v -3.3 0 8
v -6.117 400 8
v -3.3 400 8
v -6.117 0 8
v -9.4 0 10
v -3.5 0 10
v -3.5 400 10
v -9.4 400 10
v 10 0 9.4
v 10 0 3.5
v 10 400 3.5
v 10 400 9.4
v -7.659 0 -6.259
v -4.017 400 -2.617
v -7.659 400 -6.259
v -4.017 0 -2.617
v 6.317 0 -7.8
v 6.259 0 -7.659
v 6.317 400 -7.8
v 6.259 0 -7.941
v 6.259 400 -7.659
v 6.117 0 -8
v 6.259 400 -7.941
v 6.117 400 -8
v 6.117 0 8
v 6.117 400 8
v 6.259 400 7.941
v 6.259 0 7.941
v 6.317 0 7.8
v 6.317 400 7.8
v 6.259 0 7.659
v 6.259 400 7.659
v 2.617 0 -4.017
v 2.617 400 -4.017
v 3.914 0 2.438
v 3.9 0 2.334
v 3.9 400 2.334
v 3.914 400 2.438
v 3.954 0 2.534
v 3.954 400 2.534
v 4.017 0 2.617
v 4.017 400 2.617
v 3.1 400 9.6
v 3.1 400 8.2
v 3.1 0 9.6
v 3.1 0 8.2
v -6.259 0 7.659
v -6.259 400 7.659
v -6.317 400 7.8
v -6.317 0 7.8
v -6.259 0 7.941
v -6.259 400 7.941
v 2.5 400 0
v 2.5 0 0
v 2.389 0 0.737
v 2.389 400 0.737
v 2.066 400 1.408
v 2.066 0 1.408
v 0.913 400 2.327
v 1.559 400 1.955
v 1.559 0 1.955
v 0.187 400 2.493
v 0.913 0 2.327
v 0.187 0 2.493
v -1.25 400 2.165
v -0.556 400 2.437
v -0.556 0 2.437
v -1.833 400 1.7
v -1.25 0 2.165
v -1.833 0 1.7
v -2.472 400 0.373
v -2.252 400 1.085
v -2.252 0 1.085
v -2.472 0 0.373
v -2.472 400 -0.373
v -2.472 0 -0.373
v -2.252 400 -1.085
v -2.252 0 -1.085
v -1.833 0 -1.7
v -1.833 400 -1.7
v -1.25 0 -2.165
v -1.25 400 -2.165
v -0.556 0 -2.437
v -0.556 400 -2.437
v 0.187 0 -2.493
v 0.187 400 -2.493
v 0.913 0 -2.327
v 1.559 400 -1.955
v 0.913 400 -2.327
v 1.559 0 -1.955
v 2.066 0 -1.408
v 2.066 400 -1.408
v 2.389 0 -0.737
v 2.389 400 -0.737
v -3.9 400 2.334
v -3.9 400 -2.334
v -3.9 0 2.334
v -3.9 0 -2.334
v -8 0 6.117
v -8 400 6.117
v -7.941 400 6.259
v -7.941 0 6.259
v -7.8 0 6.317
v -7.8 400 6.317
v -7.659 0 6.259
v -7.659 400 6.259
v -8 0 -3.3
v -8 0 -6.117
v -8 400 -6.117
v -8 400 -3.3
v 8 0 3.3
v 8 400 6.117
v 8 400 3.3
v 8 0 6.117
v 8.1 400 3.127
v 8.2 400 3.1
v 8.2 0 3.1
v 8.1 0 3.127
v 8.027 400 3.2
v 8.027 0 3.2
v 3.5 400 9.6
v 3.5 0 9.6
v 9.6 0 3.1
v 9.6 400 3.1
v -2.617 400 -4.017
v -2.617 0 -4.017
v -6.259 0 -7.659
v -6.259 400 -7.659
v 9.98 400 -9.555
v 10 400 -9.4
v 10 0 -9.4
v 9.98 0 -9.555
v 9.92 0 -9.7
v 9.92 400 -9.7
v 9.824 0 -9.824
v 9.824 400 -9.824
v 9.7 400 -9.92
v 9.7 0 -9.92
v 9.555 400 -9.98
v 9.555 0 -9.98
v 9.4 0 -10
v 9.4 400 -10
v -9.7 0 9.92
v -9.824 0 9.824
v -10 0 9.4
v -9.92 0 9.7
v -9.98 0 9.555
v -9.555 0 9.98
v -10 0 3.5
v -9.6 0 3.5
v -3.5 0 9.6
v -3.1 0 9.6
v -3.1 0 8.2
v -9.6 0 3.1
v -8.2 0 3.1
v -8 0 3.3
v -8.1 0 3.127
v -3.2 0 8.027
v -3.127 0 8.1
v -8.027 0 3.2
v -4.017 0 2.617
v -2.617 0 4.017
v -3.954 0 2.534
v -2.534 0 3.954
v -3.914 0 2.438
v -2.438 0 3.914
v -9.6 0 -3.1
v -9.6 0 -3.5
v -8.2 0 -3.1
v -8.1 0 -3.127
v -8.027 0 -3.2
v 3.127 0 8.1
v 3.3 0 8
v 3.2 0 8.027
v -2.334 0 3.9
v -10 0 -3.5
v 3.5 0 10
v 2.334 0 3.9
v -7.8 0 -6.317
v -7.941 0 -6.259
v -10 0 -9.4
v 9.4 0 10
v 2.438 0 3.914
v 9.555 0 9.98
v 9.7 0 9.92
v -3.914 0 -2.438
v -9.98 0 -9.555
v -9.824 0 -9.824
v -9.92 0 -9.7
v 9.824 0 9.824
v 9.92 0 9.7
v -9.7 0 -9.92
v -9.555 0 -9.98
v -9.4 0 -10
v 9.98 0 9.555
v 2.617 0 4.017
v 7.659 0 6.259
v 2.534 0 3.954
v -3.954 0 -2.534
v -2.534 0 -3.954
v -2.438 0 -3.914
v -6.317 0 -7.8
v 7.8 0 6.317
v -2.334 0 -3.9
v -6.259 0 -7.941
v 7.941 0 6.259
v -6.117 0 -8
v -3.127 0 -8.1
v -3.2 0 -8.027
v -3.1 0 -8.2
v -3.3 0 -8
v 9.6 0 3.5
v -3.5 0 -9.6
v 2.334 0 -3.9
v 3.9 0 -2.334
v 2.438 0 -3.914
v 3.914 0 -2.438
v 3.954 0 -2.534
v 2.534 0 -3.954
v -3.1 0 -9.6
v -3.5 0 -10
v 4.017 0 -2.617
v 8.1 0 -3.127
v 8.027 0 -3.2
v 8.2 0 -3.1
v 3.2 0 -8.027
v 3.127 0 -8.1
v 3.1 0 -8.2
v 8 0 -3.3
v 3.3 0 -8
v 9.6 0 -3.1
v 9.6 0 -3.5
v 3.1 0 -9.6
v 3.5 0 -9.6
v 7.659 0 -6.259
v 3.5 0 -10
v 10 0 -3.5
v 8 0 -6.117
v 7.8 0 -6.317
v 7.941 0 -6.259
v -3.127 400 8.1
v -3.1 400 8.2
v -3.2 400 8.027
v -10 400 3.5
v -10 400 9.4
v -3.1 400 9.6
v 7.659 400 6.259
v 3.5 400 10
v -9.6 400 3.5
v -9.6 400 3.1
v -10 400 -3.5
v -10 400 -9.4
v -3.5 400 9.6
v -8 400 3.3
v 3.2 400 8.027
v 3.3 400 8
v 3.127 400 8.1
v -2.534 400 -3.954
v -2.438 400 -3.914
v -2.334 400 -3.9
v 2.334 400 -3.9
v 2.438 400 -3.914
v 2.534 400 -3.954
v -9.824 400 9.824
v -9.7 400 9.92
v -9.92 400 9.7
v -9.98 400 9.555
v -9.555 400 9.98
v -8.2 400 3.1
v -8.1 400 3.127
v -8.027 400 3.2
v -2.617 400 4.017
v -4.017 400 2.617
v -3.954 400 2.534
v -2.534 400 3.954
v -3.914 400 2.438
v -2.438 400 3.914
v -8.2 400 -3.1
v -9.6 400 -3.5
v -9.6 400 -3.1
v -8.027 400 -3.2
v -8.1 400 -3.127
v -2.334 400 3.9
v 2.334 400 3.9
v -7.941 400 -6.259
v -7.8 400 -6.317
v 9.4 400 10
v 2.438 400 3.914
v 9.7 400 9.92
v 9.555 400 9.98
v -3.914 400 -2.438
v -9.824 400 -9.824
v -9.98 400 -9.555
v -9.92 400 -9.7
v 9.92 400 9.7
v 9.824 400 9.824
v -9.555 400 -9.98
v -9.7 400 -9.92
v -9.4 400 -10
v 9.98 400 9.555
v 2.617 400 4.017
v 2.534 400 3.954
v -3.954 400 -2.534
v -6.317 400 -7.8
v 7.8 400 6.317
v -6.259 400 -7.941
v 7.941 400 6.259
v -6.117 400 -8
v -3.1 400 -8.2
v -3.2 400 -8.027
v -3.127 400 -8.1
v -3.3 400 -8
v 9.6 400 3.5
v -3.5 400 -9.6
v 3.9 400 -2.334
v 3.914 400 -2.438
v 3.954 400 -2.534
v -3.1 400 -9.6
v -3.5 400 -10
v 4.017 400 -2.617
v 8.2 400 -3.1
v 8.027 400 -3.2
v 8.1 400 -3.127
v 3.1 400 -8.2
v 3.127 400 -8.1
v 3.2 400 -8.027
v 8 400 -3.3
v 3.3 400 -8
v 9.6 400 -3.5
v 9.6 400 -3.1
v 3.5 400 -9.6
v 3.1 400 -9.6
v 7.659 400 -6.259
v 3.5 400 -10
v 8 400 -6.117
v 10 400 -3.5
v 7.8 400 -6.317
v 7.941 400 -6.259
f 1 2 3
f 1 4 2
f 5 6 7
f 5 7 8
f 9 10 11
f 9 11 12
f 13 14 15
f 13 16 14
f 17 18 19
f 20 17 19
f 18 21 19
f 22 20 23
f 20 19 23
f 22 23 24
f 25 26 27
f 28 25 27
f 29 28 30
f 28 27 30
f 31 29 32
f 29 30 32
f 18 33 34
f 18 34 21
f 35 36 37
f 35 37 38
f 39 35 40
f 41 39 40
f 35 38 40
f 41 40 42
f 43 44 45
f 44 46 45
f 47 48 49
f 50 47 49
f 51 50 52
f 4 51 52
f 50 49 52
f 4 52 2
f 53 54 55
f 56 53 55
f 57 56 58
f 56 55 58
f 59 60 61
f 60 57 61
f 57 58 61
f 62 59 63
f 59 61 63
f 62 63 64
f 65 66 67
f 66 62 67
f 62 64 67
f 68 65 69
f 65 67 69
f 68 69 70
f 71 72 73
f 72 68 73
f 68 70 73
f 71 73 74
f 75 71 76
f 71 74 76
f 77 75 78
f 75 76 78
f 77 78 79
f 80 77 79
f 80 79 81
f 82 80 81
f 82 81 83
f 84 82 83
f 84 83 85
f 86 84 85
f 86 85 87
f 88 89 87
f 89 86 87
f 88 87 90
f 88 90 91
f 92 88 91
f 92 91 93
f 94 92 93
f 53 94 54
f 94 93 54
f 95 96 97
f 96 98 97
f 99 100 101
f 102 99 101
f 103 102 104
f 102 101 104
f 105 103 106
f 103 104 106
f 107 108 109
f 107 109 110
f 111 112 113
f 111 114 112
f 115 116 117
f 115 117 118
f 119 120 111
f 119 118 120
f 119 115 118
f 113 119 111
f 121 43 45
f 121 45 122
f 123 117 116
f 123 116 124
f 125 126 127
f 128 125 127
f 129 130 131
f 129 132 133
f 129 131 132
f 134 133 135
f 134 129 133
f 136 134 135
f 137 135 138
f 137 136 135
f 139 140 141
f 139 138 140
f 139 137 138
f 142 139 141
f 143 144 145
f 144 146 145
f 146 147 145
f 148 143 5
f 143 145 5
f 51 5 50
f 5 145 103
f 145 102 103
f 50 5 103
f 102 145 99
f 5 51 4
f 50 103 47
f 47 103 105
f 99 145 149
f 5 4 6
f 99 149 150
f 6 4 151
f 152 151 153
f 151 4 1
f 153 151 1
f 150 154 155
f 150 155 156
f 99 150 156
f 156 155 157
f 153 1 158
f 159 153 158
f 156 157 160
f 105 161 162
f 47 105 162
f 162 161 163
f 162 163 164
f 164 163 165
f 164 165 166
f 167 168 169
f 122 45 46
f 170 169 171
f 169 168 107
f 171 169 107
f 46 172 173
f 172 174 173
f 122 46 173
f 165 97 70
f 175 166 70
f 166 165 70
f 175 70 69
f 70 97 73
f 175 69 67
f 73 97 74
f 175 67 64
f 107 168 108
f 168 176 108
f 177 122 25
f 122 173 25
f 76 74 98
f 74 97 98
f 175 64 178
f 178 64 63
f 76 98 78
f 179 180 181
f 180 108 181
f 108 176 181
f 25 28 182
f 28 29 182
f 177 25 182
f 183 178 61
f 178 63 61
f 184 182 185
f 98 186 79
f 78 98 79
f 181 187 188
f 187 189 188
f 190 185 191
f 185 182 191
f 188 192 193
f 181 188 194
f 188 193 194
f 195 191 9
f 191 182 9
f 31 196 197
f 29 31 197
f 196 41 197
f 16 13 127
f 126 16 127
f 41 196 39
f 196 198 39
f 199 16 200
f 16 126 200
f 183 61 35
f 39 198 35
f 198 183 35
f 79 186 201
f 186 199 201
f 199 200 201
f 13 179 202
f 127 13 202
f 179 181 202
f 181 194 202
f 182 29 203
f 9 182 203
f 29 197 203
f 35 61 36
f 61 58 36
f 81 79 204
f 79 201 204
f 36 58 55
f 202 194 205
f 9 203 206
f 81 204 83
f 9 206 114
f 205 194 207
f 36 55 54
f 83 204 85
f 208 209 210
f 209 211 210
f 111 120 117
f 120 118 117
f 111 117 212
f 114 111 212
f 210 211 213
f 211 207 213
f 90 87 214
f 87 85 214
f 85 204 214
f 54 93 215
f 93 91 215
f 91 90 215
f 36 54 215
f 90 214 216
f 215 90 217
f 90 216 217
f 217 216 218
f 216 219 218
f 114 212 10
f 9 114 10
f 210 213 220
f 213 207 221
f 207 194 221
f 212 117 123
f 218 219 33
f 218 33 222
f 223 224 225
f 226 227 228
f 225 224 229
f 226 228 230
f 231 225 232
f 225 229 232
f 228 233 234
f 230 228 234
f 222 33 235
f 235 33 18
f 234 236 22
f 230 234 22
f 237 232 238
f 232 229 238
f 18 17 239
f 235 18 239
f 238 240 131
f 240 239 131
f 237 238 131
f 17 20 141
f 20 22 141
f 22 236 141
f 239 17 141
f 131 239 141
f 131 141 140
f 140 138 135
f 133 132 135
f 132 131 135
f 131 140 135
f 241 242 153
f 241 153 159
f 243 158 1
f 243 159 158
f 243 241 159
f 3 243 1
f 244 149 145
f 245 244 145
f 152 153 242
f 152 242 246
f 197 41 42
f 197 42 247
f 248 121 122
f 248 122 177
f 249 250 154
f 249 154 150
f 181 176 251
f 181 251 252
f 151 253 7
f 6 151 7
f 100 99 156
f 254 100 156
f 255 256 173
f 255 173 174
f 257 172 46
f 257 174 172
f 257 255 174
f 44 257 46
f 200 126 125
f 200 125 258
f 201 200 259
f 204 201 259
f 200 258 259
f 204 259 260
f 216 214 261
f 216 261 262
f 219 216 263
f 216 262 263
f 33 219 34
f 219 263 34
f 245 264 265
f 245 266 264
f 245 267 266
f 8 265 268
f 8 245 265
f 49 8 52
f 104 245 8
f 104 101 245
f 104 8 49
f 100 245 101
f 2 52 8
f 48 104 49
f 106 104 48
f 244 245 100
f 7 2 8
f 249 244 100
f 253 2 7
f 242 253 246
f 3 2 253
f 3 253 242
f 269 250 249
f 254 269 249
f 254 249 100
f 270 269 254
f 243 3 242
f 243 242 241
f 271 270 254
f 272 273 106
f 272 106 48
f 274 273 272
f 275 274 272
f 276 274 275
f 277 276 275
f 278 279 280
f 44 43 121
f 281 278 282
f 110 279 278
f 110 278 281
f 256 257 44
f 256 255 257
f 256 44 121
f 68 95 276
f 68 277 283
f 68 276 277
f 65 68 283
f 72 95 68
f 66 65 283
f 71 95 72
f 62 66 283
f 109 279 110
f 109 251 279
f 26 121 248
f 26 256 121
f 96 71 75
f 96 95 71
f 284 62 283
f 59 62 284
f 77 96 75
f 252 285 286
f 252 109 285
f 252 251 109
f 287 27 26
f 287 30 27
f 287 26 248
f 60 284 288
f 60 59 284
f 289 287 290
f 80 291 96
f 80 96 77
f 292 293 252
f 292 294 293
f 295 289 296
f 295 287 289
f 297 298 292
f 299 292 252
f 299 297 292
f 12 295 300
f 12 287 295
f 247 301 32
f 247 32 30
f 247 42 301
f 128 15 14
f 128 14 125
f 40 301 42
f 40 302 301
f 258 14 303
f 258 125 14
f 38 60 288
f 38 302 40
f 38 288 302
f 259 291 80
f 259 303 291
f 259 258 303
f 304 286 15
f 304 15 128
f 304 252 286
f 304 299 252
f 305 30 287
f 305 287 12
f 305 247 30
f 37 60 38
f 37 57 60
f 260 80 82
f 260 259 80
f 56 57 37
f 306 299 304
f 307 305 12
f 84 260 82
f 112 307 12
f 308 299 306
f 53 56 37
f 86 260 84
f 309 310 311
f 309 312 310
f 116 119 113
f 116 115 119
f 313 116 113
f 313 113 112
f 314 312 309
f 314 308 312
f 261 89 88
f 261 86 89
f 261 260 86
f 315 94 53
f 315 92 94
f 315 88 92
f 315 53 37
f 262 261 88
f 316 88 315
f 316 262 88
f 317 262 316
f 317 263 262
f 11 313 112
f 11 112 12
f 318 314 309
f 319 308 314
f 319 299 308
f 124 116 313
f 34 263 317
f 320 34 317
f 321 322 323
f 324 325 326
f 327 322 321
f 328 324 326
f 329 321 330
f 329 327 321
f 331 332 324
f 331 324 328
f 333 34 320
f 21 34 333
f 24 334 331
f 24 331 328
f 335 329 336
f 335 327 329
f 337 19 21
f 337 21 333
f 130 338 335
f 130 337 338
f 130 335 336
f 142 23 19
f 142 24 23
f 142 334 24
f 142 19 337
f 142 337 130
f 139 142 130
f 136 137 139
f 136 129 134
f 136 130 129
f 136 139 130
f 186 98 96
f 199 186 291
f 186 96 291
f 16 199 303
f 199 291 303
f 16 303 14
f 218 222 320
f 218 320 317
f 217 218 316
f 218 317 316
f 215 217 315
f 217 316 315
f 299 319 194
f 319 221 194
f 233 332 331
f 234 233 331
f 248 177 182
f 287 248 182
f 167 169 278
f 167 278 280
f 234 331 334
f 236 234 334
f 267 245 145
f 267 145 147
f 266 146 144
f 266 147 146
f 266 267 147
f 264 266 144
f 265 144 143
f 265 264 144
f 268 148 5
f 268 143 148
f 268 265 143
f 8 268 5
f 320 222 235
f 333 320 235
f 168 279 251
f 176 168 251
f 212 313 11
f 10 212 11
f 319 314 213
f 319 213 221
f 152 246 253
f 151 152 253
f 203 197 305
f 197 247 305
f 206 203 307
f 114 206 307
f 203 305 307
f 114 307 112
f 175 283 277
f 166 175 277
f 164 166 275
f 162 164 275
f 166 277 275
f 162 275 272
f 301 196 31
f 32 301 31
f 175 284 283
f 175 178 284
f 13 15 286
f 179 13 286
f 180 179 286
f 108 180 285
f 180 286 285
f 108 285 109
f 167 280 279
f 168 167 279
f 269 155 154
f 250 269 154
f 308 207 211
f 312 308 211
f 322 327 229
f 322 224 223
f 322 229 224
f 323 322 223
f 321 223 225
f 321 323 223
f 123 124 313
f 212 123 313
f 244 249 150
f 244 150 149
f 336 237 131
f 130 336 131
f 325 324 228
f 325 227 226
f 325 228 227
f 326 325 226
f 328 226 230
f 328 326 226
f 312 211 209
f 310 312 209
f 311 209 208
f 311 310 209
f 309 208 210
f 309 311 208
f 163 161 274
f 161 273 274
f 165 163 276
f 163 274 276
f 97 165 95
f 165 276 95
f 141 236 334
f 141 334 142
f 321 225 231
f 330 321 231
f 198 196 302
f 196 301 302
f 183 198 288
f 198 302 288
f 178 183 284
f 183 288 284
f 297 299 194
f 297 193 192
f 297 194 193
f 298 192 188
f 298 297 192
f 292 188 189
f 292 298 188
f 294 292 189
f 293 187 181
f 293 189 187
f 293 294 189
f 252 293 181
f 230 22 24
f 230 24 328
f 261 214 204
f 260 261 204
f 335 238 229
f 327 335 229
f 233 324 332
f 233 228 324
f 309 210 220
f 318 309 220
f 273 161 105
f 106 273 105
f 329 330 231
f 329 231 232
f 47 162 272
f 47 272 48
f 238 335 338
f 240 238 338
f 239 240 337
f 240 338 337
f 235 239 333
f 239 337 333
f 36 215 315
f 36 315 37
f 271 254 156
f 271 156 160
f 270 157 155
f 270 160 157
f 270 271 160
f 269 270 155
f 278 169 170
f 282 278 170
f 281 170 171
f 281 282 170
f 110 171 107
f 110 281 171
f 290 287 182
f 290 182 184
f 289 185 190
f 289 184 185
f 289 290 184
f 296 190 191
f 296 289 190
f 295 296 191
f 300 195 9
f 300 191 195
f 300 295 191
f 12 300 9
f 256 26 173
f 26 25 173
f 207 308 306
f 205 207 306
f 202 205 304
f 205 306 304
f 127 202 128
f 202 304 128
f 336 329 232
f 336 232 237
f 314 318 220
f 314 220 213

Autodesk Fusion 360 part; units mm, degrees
sketch "profile" plane through (0, 0, 0) normal (0, 1, 0) x (1, 0, 0)
  circle A0 centre (0, 0) radius 2.5
  line L0 (0, -3.9) -> (-2.5, -3.9)
  line L1 (4, -4) -> (-4, 4) construction
  line L2 (-3.9092, -3.9092) -> (4, 4) construction
  line L3 (10, -10) -> (-10, -10) construction
  line L4 (-10, -10) -> (-10, 10) construction
  line L5 (-10, 10) -> (10, 10) construction
  line L6 (10, 10) -> (10, -10) construction
  line L7 (10, -10) -> (-10, 10) construction
  line L8 (-10, -10) -> (10, 10) construction
  line L9 (8, -8) -> (-8, -8) construction
  line L10 (-8, -8) -> (-8, 8) construction
  line L11 (-8, 8) -> (8, 8) construction
  line L12 (8, 8) -> (8, -8) construction
  line L13 (8, -8) -> (-8, 8) construction
  line L14 (-8, -8) -> (8, 8) construction
  line L15 (0, -8) -> (0, -10) construction
  line L16 (0, -9) -> (-3.1, -9) construction
  line L17 (-3.1, -8) -> (-3.1, -9.6)
  line L18 (-1.75, -10) -> (-1.75, -9.6) construction
  line L19 (0, -9.6) -> (-3.5, -9.6) construction
  line L20 (-3.1, -9.6) -> (-3.5, -9.6)
  line L21 (-3.5, -9.6) -> (-3.5, -10)
  line L22 (0, 0) -> (0, -8) construction
  line L23 (-3.5, -10) -> (-10, -10)
  line L24 (-3.9092, -3.9092) -> (-2.5, -3.9) construction
  line L25 (-8, -8) -> (-6.6, -8) construction
  line L26 (-8, -8) -> (-8, -7) construction
  line L27 (-2.5, -3.9) -> (-6.6, -8)
  line L28 (-6.6, -8) -> (-3.1, -8)
  line L29 (0, -2.5) -> (0, -3.9) construction
  line L30 (-3.9, 0) -> (-3.9, -2.5)
  line L31 (-3.9, -2.5) -> (-8, -6.6)
  line L32 (-8, -6.6) -> (-8, -3.1)
  line L33 (-8, -3.1) -> (-9.6, -3.1)
  line L34 (-9.6, -3.1) -> (-9.6, -3.5)
  line L35 (-9.6, -3.5) -> (-10, -3.5)
  line L36 (-10, -3.5) -> (-10, -10)
  line L37 (0, 0) -> (10, 0) construction
  line L38 (3.9, 0) -> (3.9, -2.5)
  line L39 (3.9, -2.5) -> (8, -6.6)
  line L40 (8, -6.6) -> (8, -3.1)
  line L41 (8, -3.1) -> (9.6, -3.1)
  line L42 (9.6, -3.1) -> (9.6, -3.5)
  line L43 (9.6, -3.5) -> (10, -3.5)
  line L44 (10, -3.5) -> (10, -10)
  line L45 (0, -3.9) -> (2.5, -3.9)
  line L46 (6.6, -8) -> (3.1, -8)
  line L47 (3.1, -8) -> (3.1, -9.6)
  line L48 (3.1, -9.6) -> (3.5, -9.6)
  line L49 (3.5, -9.6) -> (3.5, -10)
  line L50 (3.5, -10) -> (10, -10)
  line L51 (2.5, -3.9) -> (6.6, -8)
  line L52 (-3.9, 0) -> (-3.9, 2.5)
  line L53 (-3.9, 2.5) -> (-8, 6.6)
  line L54 (-8, 6.6) -> (-8, 3.1)
  line L55 (-8, 3.1) -> (-9.6, 3.1)
  line L56 (-9.6, 3.1) -> (-9.6, 3.5)
  line L57 (-9.6, 3.5) -> (-10, 3.5)
  line L58 (-10, 3.5) -> (-10, 10)
  line L59 (0, 3.9) -> (-2.5, 3.9)
  line L60 (-6.6, 8) -> (-3.1, 8)
  line L61 (-3.1, 8) -> (-3.1, 9.6)
  line L62 (-3.1, 9.6) -> (-3.5, 9.6)
  line L63 (-3.5, 9.6) -> (-3.5, 10)
  line L64 (-3.5, 10) -> (-10, 10)
  line L65 (-2.5, 3.9) -> (-6.6, 8)
  line L66 (0, 3.9) -> (2.5, 3.9)
  line L67 (6.6, 8) -> (3.1, 8)
  line L68 (3.1, 8) -> (3.1, 9.6)
  line L69 (3.1, 9.6) -> (3.5, 9.6)
  line L70 (3.5, 9.6) -> (3.5, 10)
  line L71 (3.5, 10) -> (10, 10)
  line L72 (2.5, 3.9) -> (6.6, 8)
  line L73 (3.9, 0) -> (3.9, 2.5)
  line L74 (8, 6.6) -> (8, 3.1)
  line L75 (8, 3.1) -> (9.6, 3.1)
  line L76 (9.6, 3.1) -> (9.6, 3.5)
  line L77 (9.6, 3.5) -> (10, 3.5)
  line L78 (10, 3.5) -> (10, 10)
  line L79 (3.9, 2.5) -> (8, 6.6)
  dimension "d3" = 5
  dimension "d7" = 8
  dimension "d8" = 8
  dimension "d9" = 20
  dimension "d10" = 20
  dimension "d11" = 16
  dimension "d12" = 16
  dimension "d13" = 3.1
  dimension "d14" = 0.4
  dimension "d15" = 3.5
  dimension "d20" = 2.5
  dimension "d21" = 1.4
extrude "Extrude3" add sketch "profile" along normal blind 400
fillet "Fillet1" radius 0.6 4 edges at (-10, 200, 10) (10, 200, 10) (10, 200, -10) (-10, 200, -10)
fillet "Fillet1" radius 0.2 8 edges at (3.1, 200, 8) (8, 200, 3.1) (8, 200, -3.1) (3.1, 200, -8) (-3.1, 200, 8) (-8, 200, 3.1) (-3.1, 200, -8) (-8, 200, -3.1)
fillet "Fillet1" radius 0.2 8 edges at (-8, 200, 6.6) (-6.6, 200, 8) (6.6, 200, 8) (8, 200, 6.6) (8, 200, -6.6) (6.6, 200, -8) (-6.6, 200, -8) (-8, 200, -6.6)
fillet "Fillet1" radius 0.4 8 edges at (-2.5, 200, 3.9) (2.5, 200, 3.9) (3.9, 200, 2.5) (3.9, 200, -2.5) (2.5, 200, -3.9) (-2.5, 200, -3.9) (-3.9, 200, -2.5) (-3.9, 200, 2.5)
equation "d13 = ( 6.2 / 2 ) * 1 mm"
equation "d15 = 7 mm / 2"
